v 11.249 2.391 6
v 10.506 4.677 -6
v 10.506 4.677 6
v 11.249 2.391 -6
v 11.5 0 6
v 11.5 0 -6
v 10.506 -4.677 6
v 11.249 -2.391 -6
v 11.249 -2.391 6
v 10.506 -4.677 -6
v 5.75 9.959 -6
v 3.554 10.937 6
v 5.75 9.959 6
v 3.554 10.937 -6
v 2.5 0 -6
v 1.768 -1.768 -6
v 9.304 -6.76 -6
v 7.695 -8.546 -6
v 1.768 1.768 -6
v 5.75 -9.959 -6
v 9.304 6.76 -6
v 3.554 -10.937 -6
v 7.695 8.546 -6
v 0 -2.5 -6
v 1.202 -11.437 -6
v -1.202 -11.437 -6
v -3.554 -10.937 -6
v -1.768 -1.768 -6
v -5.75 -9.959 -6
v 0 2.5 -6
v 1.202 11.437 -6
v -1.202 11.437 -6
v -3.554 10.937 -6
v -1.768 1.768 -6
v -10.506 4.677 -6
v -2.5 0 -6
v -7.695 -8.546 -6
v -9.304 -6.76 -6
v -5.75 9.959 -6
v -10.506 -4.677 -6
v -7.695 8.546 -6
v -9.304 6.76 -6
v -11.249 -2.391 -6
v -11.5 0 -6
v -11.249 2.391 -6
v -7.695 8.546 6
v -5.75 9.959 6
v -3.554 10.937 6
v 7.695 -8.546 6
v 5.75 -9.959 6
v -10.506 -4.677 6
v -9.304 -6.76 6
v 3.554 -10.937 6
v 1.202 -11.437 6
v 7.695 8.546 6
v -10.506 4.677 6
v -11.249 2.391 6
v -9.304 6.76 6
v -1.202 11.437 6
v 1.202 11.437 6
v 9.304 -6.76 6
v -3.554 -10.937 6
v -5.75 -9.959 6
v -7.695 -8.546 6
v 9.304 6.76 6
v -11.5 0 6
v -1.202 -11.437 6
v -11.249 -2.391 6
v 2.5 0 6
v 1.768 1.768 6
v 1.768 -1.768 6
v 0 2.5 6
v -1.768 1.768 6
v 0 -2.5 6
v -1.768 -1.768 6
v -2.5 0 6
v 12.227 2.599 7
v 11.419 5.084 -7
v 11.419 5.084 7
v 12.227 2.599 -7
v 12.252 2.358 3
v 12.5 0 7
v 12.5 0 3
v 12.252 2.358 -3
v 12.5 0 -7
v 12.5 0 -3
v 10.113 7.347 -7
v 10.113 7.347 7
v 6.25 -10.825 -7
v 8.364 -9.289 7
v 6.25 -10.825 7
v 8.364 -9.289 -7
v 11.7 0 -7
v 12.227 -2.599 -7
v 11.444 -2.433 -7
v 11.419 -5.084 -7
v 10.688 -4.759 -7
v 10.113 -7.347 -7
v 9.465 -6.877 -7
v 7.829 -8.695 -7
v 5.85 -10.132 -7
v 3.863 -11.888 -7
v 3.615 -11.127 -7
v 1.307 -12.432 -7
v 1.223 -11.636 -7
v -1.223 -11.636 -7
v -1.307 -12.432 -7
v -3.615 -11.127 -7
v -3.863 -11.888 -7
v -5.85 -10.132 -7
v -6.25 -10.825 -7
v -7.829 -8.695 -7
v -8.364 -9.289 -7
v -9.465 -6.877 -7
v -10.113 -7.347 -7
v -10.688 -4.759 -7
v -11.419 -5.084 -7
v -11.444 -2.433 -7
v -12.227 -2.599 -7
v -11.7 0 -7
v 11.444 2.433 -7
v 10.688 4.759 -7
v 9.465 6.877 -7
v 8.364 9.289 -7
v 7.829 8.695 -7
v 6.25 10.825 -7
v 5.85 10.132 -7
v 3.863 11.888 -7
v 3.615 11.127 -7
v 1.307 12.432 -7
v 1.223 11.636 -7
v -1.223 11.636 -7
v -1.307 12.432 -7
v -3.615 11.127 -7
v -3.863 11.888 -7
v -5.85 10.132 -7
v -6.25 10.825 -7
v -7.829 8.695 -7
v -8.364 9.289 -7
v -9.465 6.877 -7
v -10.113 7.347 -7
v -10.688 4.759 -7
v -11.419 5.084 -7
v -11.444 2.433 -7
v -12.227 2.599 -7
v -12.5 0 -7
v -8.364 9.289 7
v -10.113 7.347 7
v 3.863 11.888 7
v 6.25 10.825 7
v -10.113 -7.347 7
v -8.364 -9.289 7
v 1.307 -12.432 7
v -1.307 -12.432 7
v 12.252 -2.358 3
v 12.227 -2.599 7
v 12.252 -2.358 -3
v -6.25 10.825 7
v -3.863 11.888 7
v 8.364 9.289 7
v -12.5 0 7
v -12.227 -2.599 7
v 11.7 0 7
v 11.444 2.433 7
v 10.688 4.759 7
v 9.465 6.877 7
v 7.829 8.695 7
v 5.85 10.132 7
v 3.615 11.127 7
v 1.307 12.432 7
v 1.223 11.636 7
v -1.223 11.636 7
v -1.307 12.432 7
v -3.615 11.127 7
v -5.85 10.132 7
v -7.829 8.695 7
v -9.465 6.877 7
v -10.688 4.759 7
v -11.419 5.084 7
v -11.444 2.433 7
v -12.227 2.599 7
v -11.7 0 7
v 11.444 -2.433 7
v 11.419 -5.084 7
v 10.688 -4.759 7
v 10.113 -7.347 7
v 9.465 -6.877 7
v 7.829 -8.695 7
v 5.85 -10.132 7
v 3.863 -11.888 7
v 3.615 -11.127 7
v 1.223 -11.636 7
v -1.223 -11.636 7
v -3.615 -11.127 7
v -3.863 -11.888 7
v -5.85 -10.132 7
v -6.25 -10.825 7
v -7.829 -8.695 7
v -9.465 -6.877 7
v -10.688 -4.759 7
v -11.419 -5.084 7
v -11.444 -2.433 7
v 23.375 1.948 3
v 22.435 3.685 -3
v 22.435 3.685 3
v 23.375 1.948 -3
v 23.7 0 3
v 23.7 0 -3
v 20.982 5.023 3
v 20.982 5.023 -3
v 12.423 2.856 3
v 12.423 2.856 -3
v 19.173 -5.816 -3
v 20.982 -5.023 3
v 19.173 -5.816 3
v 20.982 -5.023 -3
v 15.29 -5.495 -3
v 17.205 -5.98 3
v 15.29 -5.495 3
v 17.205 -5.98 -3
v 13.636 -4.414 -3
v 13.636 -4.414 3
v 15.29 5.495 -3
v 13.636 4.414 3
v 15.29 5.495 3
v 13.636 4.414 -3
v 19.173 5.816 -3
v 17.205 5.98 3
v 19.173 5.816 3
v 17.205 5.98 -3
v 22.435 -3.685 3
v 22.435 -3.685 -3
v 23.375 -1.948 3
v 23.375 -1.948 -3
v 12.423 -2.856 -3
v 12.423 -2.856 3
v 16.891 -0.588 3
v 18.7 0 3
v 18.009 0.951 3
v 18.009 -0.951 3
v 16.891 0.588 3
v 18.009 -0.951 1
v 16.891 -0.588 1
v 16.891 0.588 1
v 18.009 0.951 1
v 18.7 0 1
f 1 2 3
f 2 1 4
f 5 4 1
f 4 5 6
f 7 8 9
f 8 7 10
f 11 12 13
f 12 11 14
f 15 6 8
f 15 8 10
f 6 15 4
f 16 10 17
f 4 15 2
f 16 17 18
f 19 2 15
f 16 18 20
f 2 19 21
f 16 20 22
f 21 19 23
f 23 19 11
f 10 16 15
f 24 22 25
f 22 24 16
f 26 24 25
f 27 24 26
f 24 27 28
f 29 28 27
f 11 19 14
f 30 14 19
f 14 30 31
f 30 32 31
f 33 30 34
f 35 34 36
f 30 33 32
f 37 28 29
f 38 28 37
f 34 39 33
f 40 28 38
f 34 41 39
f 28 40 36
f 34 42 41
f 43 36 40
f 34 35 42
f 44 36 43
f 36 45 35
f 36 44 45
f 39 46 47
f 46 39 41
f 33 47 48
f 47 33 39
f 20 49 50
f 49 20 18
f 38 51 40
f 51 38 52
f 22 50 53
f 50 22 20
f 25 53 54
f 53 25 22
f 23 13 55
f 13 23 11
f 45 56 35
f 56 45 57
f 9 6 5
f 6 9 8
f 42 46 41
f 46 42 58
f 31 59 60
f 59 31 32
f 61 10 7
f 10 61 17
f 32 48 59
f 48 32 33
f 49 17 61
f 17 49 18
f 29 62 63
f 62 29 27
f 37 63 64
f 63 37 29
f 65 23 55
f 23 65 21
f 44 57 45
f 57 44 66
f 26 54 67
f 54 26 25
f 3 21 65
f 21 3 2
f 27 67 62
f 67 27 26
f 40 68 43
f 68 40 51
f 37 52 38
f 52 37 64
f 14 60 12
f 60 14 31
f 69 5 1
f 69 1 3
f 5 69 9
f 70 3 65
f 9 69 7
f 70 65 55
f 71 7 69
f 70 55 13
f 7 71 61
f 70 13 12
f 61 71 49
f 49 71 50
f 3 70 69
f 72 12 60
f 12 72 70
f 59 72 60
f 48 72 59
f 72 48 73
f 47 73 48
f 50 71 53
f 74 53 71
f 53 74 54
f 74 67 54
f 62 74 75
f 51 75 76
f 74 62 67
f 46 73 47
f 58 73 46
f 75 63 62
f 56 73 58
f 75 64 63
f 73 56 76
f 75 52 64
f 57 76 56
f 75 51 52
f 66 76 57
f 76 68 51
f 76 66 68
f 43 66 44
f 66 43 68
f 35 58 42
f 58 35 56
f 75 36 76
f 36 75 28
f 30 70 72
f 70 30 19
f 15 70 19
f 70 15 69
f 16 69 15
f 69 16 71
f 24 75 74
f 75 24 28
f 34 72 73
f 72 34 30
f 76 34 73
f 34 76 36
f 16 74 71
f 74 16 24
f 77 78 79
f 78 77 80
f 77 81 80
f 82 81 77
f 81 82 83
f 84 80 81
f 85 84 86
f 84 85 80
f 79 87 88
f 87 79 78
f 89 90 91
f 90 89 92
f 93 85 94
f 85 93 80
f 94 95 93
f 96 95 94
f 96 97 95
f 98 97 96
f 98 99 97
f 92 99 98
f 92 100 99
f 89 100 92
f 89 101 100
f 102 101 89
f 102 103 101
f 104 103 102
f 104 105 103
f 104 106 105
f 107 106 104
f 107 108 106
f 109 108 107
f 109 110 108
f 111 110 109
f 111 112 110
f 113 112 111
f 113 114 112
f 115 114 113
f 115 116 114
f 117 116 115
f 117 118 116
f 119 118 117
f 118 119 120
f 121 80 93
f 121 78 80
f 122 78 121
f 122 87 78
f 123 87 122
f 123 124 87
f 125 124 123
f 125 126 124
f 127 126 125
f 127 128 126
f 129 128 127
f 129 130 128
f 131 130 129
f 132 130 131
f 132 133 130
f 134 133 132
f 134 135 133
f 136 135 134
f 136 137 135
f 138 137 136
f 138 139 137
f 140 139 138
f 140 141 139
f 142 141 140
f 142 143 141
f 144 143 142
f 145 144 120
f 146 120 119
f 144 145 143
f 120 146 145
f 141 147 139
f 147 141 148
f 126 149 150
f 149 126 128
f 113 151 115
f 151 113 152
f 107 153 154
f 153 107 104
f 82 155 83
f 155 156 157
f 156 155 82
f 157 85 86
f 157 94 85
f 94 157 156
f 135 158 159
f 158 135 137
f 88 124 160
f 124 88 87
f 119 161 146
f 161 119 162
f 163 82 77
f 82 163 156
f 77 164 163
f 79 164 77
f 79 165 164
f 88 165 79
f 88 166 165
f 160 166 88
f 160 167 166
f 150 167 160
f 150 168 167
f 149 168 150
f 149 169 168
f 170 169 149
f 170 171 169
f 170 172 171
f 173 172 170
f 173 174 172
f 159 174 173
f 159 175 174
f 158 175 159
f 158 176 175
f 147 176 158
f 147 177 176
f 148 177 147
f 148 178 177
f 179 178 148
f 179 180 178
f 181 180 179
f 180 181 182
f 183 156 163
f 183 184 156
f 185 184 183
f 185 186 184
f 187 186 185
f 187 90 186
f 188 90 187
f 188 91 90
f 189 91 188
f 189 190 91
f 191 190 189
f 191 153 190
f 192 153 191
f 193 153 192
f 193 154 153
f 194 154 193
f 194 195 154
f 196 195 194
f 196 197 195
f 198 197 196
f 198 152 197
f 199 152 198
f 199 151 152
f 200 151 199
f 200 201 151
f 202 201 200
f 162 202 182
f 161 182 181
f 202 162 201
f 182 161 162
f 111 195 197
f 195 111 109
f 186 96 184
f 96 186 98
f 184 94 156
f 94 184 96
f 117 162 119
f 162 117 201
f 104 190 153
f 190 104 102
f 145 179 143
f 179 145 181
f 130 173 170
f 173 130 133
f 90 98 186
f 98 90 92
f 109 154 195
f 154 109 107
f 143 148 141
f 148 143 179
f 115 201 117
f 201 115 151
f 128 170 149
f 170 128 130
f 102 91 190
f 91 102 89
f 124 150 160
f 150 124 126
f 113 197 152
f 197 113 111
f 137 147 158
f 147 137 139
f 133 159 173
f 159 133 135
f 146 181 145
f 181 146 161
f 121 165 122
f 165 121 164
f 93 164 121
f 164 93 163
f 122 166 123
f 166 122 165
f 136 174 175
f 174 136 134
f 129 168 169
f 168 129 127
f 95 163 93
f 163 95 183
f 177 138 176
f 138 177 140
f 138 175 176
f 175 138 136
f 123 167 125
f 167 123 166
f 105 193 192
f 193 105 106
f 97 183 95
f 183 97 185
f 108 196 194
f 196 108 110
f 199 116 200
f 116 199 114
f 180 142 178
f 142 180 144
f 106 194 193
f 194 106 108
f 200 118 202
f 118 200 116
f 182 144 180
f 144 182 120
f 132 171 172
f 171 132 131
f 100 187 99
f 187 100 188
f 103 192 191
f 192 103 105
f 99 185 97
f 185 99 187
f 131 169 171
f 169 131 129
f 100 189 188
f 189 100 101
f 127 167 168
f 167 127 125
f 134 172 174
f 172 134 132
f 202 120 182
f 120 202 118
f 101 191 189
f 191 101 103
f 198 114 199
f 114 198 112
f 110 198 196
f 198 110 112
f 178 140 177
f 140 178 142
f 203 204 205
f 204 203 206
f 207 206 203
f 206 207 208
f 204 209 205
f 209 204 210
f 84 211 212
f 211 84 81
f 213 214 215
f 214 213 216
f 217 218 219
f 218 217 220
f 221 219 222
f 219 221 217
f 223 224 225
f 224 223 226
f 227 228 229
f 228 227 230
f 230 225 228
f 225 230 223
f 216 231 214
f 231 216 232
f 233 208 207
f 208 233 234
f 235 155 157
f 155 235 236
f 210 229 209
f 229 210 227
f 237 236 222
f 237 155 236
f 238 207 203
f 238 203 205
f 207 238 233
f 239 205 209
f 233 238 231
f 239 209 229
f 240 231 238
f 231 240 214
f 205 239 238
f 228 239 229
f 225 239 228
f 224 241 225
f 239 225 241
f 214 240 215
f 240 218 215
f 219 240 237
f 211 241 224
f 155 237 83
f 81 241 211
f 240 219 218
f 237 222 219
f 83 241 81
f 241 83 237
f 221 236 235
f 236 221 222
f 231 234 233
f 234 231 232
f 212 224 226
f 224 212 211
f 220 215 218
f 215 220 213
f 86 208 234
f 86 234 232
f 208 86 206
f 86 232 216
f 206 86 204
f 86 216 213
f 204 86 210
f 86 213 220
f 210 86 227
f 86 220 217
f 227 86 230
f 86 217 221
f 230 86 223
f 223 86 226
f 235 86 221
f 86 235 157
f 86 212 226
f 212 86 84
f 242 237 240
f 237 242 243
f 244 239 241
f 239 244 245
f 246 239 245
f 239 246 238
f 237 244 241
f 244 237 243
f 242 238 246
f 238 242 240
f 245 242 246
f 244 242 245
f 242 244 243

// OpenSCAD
// Parameters
stator_diameter_mm = 23.0; //[12.0:46.0:0.5]
stator_height_mm = 12.0; //[6.0:24.0:0.5]
stator_inner_bore_diameter_mm = 5.0; //[2.5:10.0:0.25]
outer_can_diameter_mm = 25.0; //[13.0:50.0:0.5]
outer_can_height_mm = 14.0; //[7.0:28.0:0.5]
clearance_mm = 0.2; //[0.0:1.0:0.05]
outer_can_wall_mm = 0.8; //[0.4:2.0:0.1]
connect_overlap_mm = 1.0; //[0.5:2.0:0.1]
buzzer_diameter_mm = 12.0; //[6.0:24.0:0.5]
buzzer_height_mm = 6.0; //[3.0:12.0:0.5]
buzzer_inner_radius_mm = 1.0; //[0.5:2.0:0.1]
buzzer_pin_diameter_mm = 2.0; //[1.0:3.0:0.1]
buzzer_pin_height_offset_mm = 3.0; //[1.0:6.0:0.5]
bridge_thickness_mm = 2.0; //[1.0:4.0:0.25]
bridge_width_mm = 4.0; //[2.0:10.0:0.5]

// Buzzer - complete geometry
module buzzer() {
  color([0.15, 0.2, 0.35]) {
    // Buzzer body
    difference() {
      cylinder(r=buzzer_diameter_mm/2, h=buzzer_height_mm, center=true);
      translate([0, 0, 0])
        cylinder(r=buzzer_inner_radius_mm, h=buzzer_height_mm + 2*connect_overlap_mm, center=true);
    }
    // Buzzer pin
    translate([0, 0, (-buzzer_height_mm/2) + (max(buzzer_height_mm - buzzer_pin_height_offset_mm, connect_overlap_mm))/2])
      cylinder(r=buzzer_pin_diameter_mm/2, h=max(buzzer_height_mm - buzzer_pin_height_offset_mm, connect_overlap_mm), center=true);
  }
}

// Assembly
module assembly() {
  // Stator
  color("DimGray") {
    difference() {
      cylinder(r=stator_diameter_mm/2, h=stator_height_mm, center=true);
      cylinder(r=stator_inner_bore_diameter_mm/2, h=stator_height_mm + 2*connect_overlap_mm, center=true);
    }
  }
  
  // Outer can
  color("Silver") {
    difference() {
      cylinder(r=outer_can_diameter_mm/2, h=outer_can_height_mm, center=true);
      cylinder(r=outer_can_diameter_mm/2 - outer_can_wall_mm, h=outer_can_height_mm + 2*connect_overlap_mm, center=true);
    }
  }
  
  // Buzzer with bridge
  translate([outer_can_diameter_mm/2 + clearance_mm + buzzer_diameter_mm/2 - connect_overlap_mm, 0, 0]) {
    buzzer();
    // Bridge
    translate([-(clearance_mm + 2*connect_overlap_mm)/2 + connect_overlap_mm, 0, 0])
      color("Black") cube([clearance_mm + 2*connect_overlap_mm, bridge_width_mm, bridge_thickness_mm], center=true);
  }
}

assembly();
